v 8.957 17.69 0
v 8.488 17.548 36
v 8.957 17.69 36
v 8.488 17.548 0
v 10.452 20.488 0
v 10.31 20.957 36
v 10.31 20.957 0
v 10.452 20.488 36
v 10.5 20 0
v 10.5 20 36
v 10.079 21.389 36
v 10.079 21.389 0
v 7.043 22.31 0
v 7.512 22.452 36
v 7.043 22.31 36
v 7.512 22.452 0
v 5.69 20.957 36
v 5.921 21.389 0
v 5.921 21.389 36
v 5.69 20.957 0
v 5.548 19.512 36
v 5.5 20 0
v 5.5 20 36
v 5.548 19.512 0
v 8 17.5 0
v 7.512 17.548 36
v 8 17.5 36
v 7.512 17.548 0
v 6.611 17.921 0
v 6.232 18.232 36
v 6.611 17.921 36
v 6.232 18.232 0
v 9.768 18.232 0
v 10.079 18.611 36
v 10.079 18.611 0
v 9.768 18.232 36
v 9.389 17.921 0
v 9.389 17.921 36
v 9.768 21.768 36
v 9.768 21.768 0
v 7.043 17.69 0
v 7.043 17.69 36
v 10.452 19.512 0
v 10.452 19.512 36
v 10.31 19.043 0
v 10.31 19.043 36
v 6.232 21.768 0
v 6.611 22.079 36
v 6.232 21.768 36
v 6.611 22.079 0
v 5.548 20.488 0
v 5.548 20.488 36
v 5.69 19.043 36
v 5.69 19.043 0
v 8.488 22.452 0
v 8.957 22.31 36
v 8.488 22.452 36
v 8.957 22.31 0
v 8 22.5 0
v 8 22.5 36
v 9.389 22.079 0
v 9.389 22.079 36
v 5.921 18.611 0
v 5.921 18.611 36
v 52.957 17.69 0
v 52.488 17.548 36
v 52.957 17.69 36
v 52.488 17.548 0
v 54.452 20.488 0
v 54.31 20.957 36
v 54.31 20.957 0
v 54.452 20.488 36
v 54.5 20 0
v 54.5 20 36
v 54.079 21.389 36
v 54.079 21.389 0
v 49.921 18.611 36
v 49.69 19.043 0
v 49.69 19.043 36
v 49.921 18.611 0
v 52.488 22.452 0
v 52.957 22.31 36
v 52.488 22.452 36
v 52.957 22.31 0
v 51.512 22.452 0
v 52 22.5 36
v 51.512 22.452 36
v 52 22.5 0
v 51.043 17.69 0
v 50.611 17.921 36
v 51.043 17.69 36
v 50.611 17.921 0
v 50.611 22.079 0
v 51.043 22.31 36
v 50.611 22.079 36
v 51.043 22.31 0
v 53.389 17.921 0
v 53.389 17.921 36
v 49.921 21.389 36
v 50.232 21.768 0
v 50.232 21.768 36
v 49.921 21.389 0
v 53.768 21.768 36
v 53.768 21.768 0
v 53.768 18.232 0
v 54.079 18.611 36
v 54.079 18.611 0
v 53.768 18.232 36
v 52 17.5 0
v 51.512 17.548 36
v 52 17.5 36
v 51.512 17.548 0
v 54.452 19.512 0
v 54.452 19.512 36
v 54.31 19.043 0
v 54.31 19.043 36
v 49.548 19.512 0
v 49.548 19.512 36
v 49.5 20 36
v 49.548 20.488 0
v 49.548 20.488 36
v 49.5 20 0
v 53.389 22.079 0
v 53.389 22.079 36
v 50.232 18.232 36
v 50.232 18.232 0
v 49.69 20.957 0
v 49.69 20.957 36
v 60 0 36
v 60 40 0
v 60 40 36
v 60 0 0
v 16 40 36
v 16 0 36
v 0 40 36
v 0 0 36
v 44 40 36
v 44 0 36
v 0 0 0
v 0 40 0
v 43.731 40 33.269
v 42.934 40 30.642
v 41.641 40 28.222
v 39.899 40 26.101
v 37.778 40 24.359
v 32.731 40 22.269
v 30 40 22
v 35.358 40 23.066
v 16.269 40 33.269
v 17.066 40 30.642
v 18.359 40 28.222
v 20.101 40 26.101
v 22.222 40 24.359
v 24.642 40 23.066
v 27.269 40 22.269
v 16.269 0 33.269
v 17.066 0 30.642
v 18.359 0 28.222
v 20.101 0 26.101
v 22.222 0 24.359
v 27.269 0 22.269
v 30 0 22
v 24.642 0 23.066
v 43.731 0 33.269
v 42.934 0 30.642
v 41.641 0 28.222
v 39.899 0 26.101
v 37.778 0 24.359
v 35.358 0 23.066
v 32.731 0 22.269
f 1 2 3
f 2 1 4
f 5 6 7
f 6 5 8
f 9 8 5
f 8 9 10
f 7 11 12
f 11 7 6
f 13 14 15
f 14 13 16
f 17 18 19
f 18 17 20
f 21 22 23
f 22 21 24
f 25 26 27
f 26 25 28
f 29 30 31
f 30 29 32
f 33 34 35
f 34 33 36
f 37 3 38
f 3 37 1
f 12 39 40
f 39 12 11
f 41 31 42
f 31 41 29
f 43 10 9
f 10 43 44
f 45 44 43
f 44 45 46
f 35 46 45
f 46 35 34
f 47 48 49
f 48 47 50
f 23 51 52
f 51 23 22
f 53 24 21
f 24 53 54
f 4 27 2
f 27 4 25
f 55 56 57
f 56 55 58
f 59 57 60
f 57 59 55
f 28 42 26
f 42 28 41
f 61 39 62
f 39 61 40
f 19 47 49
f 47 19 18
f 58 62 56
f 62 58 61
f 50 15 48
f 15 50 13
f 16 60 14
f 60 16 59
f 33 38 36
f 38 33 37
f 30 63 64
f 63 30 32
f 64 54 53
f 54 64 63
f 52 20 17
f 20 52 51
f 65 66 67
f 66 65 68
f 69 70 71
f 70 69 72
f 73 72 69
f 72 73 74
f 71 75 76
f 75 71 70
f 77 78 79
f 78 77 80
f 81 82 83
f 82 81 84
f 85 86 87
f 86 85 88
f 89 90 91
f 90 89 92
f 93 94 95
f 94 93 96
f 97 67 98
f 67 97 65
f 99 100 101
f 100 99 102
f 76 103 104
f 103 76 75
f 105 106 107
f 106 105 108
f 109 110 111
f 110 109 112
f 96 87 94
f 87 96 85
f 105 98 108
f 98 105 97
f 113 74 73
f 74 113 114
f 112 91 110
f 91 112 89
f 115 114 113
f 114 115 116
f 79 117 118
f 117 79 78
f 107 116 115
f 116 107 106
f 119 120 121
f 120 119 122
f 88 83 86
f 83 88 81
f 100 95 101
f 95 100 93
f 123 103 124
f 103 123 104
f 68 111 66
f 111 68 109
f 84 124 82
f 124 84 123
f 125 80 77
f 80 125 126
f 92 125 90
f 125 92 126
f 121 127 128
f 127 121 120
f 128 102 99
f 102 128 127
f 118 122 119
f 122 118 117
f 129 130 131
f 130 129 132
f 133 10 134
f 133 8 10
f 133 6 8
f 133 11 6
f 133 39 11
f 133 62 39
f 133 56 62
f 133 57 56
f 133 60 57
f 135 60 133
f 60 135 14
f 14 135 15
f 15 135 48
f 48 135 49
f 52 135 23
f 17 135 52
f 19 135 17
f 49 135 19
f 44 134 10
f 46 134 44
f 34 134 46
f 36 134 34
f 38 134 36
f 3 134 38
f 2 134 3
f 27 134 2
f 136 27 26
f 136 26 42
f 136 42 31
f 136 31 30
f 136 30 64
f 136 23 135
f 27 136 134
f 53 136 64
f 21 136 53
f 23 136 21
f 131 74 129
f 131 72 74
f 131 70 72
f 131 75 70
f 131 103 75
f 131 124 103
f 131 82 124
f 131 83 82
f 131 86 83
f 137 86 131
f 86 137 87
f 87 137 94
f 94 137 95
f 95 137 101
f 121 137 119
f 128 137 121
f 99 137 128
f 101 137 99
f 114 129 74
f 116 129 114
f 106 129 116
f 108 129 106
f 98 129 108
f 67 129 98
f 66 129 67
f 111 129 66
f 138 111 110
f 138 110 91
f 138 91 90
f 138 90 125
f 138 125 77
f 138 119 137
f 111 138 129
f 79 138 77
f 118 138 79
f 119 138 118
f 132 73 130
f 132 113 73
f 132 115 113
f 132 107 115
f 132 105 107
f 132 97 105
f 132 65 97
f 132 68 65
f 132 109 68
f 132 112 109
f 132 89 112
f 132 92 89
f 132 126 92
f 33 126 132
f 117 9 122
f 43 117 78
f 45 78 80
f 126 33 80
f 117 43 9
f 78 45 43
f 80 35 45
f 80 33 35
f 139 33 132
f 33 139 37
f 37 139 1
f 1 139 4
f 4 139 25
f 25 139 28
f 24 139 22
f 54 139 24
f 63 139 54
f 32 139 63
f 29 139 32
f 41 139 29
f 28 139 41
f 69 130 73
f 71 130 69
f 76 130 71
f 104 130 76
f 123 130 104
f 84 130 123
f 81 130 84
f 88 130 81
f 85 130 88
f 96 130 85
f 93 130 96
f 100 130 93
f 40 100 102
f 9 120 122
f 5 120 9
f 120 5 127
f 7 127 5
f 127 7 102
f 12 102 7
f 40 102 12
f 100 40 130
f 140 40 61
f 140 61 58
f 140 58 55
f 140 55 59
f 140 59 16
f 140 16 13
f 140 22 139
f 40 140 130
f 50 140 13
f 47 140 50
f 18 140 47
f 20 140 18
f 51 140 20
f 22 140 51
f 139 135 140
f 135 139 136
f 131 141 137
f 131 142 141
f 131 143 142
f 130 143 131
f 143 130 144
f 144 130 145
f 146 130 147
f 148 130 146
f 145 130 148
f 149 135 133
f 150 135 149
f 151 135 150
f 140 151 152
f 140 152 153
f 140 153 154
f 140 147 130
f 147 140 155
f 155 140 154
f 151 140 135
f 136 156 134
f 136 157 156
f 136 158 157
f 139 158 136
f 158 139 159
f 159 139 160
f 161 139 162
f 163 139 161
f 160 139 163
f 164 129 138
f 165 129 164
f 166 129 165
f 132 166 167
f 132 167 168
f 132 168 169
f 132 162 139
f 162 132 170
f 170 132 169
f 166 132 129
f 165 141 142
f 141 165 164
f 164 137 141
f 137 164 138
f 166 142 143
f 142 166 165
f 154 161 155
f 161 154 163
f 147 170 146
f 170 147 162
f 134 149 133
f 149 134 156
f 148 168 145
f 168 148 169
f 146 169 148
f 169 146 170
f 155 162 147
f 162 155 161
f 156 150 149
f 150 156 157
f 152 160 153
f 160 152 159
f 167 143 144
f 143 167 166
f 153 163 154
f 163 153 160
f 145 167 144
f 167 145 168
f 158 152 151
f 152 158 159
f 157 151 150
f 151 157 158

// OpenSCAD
$fn = 32;

// ----------------------------------------------------------------------
// Saddle clamp: plain shaft clamp
// ----------------------------------------------------------------------

// --- parameters (mm) ---
blk_l = 60;               // block length, X
blk_w = 40;               // block width, Y
blk_h = 36;               // block height
clamp_r = 14;             // shaft groove radius
hole_r = 2.5;             // bolt hole radius
hole_m = 8;               // bolt hole margin from the ends

saw_depth = clamp_r + 3;  // saw kerf depth

difference() {
  cube([blk_l, blk_w, blk_h]);
  translate([blk_l / 2, -1, blk_h])
    rotate([-90, 0, 0])
      cylinder(h = blk_w + 2, r = clamp_r);
  for (sx = [0, 1])
    translate([sx ? blk_l - hole_m : hole_m, blk_w / 2, -1])
      cylinder(r = hole_r, h = blk_h + 2);
}
